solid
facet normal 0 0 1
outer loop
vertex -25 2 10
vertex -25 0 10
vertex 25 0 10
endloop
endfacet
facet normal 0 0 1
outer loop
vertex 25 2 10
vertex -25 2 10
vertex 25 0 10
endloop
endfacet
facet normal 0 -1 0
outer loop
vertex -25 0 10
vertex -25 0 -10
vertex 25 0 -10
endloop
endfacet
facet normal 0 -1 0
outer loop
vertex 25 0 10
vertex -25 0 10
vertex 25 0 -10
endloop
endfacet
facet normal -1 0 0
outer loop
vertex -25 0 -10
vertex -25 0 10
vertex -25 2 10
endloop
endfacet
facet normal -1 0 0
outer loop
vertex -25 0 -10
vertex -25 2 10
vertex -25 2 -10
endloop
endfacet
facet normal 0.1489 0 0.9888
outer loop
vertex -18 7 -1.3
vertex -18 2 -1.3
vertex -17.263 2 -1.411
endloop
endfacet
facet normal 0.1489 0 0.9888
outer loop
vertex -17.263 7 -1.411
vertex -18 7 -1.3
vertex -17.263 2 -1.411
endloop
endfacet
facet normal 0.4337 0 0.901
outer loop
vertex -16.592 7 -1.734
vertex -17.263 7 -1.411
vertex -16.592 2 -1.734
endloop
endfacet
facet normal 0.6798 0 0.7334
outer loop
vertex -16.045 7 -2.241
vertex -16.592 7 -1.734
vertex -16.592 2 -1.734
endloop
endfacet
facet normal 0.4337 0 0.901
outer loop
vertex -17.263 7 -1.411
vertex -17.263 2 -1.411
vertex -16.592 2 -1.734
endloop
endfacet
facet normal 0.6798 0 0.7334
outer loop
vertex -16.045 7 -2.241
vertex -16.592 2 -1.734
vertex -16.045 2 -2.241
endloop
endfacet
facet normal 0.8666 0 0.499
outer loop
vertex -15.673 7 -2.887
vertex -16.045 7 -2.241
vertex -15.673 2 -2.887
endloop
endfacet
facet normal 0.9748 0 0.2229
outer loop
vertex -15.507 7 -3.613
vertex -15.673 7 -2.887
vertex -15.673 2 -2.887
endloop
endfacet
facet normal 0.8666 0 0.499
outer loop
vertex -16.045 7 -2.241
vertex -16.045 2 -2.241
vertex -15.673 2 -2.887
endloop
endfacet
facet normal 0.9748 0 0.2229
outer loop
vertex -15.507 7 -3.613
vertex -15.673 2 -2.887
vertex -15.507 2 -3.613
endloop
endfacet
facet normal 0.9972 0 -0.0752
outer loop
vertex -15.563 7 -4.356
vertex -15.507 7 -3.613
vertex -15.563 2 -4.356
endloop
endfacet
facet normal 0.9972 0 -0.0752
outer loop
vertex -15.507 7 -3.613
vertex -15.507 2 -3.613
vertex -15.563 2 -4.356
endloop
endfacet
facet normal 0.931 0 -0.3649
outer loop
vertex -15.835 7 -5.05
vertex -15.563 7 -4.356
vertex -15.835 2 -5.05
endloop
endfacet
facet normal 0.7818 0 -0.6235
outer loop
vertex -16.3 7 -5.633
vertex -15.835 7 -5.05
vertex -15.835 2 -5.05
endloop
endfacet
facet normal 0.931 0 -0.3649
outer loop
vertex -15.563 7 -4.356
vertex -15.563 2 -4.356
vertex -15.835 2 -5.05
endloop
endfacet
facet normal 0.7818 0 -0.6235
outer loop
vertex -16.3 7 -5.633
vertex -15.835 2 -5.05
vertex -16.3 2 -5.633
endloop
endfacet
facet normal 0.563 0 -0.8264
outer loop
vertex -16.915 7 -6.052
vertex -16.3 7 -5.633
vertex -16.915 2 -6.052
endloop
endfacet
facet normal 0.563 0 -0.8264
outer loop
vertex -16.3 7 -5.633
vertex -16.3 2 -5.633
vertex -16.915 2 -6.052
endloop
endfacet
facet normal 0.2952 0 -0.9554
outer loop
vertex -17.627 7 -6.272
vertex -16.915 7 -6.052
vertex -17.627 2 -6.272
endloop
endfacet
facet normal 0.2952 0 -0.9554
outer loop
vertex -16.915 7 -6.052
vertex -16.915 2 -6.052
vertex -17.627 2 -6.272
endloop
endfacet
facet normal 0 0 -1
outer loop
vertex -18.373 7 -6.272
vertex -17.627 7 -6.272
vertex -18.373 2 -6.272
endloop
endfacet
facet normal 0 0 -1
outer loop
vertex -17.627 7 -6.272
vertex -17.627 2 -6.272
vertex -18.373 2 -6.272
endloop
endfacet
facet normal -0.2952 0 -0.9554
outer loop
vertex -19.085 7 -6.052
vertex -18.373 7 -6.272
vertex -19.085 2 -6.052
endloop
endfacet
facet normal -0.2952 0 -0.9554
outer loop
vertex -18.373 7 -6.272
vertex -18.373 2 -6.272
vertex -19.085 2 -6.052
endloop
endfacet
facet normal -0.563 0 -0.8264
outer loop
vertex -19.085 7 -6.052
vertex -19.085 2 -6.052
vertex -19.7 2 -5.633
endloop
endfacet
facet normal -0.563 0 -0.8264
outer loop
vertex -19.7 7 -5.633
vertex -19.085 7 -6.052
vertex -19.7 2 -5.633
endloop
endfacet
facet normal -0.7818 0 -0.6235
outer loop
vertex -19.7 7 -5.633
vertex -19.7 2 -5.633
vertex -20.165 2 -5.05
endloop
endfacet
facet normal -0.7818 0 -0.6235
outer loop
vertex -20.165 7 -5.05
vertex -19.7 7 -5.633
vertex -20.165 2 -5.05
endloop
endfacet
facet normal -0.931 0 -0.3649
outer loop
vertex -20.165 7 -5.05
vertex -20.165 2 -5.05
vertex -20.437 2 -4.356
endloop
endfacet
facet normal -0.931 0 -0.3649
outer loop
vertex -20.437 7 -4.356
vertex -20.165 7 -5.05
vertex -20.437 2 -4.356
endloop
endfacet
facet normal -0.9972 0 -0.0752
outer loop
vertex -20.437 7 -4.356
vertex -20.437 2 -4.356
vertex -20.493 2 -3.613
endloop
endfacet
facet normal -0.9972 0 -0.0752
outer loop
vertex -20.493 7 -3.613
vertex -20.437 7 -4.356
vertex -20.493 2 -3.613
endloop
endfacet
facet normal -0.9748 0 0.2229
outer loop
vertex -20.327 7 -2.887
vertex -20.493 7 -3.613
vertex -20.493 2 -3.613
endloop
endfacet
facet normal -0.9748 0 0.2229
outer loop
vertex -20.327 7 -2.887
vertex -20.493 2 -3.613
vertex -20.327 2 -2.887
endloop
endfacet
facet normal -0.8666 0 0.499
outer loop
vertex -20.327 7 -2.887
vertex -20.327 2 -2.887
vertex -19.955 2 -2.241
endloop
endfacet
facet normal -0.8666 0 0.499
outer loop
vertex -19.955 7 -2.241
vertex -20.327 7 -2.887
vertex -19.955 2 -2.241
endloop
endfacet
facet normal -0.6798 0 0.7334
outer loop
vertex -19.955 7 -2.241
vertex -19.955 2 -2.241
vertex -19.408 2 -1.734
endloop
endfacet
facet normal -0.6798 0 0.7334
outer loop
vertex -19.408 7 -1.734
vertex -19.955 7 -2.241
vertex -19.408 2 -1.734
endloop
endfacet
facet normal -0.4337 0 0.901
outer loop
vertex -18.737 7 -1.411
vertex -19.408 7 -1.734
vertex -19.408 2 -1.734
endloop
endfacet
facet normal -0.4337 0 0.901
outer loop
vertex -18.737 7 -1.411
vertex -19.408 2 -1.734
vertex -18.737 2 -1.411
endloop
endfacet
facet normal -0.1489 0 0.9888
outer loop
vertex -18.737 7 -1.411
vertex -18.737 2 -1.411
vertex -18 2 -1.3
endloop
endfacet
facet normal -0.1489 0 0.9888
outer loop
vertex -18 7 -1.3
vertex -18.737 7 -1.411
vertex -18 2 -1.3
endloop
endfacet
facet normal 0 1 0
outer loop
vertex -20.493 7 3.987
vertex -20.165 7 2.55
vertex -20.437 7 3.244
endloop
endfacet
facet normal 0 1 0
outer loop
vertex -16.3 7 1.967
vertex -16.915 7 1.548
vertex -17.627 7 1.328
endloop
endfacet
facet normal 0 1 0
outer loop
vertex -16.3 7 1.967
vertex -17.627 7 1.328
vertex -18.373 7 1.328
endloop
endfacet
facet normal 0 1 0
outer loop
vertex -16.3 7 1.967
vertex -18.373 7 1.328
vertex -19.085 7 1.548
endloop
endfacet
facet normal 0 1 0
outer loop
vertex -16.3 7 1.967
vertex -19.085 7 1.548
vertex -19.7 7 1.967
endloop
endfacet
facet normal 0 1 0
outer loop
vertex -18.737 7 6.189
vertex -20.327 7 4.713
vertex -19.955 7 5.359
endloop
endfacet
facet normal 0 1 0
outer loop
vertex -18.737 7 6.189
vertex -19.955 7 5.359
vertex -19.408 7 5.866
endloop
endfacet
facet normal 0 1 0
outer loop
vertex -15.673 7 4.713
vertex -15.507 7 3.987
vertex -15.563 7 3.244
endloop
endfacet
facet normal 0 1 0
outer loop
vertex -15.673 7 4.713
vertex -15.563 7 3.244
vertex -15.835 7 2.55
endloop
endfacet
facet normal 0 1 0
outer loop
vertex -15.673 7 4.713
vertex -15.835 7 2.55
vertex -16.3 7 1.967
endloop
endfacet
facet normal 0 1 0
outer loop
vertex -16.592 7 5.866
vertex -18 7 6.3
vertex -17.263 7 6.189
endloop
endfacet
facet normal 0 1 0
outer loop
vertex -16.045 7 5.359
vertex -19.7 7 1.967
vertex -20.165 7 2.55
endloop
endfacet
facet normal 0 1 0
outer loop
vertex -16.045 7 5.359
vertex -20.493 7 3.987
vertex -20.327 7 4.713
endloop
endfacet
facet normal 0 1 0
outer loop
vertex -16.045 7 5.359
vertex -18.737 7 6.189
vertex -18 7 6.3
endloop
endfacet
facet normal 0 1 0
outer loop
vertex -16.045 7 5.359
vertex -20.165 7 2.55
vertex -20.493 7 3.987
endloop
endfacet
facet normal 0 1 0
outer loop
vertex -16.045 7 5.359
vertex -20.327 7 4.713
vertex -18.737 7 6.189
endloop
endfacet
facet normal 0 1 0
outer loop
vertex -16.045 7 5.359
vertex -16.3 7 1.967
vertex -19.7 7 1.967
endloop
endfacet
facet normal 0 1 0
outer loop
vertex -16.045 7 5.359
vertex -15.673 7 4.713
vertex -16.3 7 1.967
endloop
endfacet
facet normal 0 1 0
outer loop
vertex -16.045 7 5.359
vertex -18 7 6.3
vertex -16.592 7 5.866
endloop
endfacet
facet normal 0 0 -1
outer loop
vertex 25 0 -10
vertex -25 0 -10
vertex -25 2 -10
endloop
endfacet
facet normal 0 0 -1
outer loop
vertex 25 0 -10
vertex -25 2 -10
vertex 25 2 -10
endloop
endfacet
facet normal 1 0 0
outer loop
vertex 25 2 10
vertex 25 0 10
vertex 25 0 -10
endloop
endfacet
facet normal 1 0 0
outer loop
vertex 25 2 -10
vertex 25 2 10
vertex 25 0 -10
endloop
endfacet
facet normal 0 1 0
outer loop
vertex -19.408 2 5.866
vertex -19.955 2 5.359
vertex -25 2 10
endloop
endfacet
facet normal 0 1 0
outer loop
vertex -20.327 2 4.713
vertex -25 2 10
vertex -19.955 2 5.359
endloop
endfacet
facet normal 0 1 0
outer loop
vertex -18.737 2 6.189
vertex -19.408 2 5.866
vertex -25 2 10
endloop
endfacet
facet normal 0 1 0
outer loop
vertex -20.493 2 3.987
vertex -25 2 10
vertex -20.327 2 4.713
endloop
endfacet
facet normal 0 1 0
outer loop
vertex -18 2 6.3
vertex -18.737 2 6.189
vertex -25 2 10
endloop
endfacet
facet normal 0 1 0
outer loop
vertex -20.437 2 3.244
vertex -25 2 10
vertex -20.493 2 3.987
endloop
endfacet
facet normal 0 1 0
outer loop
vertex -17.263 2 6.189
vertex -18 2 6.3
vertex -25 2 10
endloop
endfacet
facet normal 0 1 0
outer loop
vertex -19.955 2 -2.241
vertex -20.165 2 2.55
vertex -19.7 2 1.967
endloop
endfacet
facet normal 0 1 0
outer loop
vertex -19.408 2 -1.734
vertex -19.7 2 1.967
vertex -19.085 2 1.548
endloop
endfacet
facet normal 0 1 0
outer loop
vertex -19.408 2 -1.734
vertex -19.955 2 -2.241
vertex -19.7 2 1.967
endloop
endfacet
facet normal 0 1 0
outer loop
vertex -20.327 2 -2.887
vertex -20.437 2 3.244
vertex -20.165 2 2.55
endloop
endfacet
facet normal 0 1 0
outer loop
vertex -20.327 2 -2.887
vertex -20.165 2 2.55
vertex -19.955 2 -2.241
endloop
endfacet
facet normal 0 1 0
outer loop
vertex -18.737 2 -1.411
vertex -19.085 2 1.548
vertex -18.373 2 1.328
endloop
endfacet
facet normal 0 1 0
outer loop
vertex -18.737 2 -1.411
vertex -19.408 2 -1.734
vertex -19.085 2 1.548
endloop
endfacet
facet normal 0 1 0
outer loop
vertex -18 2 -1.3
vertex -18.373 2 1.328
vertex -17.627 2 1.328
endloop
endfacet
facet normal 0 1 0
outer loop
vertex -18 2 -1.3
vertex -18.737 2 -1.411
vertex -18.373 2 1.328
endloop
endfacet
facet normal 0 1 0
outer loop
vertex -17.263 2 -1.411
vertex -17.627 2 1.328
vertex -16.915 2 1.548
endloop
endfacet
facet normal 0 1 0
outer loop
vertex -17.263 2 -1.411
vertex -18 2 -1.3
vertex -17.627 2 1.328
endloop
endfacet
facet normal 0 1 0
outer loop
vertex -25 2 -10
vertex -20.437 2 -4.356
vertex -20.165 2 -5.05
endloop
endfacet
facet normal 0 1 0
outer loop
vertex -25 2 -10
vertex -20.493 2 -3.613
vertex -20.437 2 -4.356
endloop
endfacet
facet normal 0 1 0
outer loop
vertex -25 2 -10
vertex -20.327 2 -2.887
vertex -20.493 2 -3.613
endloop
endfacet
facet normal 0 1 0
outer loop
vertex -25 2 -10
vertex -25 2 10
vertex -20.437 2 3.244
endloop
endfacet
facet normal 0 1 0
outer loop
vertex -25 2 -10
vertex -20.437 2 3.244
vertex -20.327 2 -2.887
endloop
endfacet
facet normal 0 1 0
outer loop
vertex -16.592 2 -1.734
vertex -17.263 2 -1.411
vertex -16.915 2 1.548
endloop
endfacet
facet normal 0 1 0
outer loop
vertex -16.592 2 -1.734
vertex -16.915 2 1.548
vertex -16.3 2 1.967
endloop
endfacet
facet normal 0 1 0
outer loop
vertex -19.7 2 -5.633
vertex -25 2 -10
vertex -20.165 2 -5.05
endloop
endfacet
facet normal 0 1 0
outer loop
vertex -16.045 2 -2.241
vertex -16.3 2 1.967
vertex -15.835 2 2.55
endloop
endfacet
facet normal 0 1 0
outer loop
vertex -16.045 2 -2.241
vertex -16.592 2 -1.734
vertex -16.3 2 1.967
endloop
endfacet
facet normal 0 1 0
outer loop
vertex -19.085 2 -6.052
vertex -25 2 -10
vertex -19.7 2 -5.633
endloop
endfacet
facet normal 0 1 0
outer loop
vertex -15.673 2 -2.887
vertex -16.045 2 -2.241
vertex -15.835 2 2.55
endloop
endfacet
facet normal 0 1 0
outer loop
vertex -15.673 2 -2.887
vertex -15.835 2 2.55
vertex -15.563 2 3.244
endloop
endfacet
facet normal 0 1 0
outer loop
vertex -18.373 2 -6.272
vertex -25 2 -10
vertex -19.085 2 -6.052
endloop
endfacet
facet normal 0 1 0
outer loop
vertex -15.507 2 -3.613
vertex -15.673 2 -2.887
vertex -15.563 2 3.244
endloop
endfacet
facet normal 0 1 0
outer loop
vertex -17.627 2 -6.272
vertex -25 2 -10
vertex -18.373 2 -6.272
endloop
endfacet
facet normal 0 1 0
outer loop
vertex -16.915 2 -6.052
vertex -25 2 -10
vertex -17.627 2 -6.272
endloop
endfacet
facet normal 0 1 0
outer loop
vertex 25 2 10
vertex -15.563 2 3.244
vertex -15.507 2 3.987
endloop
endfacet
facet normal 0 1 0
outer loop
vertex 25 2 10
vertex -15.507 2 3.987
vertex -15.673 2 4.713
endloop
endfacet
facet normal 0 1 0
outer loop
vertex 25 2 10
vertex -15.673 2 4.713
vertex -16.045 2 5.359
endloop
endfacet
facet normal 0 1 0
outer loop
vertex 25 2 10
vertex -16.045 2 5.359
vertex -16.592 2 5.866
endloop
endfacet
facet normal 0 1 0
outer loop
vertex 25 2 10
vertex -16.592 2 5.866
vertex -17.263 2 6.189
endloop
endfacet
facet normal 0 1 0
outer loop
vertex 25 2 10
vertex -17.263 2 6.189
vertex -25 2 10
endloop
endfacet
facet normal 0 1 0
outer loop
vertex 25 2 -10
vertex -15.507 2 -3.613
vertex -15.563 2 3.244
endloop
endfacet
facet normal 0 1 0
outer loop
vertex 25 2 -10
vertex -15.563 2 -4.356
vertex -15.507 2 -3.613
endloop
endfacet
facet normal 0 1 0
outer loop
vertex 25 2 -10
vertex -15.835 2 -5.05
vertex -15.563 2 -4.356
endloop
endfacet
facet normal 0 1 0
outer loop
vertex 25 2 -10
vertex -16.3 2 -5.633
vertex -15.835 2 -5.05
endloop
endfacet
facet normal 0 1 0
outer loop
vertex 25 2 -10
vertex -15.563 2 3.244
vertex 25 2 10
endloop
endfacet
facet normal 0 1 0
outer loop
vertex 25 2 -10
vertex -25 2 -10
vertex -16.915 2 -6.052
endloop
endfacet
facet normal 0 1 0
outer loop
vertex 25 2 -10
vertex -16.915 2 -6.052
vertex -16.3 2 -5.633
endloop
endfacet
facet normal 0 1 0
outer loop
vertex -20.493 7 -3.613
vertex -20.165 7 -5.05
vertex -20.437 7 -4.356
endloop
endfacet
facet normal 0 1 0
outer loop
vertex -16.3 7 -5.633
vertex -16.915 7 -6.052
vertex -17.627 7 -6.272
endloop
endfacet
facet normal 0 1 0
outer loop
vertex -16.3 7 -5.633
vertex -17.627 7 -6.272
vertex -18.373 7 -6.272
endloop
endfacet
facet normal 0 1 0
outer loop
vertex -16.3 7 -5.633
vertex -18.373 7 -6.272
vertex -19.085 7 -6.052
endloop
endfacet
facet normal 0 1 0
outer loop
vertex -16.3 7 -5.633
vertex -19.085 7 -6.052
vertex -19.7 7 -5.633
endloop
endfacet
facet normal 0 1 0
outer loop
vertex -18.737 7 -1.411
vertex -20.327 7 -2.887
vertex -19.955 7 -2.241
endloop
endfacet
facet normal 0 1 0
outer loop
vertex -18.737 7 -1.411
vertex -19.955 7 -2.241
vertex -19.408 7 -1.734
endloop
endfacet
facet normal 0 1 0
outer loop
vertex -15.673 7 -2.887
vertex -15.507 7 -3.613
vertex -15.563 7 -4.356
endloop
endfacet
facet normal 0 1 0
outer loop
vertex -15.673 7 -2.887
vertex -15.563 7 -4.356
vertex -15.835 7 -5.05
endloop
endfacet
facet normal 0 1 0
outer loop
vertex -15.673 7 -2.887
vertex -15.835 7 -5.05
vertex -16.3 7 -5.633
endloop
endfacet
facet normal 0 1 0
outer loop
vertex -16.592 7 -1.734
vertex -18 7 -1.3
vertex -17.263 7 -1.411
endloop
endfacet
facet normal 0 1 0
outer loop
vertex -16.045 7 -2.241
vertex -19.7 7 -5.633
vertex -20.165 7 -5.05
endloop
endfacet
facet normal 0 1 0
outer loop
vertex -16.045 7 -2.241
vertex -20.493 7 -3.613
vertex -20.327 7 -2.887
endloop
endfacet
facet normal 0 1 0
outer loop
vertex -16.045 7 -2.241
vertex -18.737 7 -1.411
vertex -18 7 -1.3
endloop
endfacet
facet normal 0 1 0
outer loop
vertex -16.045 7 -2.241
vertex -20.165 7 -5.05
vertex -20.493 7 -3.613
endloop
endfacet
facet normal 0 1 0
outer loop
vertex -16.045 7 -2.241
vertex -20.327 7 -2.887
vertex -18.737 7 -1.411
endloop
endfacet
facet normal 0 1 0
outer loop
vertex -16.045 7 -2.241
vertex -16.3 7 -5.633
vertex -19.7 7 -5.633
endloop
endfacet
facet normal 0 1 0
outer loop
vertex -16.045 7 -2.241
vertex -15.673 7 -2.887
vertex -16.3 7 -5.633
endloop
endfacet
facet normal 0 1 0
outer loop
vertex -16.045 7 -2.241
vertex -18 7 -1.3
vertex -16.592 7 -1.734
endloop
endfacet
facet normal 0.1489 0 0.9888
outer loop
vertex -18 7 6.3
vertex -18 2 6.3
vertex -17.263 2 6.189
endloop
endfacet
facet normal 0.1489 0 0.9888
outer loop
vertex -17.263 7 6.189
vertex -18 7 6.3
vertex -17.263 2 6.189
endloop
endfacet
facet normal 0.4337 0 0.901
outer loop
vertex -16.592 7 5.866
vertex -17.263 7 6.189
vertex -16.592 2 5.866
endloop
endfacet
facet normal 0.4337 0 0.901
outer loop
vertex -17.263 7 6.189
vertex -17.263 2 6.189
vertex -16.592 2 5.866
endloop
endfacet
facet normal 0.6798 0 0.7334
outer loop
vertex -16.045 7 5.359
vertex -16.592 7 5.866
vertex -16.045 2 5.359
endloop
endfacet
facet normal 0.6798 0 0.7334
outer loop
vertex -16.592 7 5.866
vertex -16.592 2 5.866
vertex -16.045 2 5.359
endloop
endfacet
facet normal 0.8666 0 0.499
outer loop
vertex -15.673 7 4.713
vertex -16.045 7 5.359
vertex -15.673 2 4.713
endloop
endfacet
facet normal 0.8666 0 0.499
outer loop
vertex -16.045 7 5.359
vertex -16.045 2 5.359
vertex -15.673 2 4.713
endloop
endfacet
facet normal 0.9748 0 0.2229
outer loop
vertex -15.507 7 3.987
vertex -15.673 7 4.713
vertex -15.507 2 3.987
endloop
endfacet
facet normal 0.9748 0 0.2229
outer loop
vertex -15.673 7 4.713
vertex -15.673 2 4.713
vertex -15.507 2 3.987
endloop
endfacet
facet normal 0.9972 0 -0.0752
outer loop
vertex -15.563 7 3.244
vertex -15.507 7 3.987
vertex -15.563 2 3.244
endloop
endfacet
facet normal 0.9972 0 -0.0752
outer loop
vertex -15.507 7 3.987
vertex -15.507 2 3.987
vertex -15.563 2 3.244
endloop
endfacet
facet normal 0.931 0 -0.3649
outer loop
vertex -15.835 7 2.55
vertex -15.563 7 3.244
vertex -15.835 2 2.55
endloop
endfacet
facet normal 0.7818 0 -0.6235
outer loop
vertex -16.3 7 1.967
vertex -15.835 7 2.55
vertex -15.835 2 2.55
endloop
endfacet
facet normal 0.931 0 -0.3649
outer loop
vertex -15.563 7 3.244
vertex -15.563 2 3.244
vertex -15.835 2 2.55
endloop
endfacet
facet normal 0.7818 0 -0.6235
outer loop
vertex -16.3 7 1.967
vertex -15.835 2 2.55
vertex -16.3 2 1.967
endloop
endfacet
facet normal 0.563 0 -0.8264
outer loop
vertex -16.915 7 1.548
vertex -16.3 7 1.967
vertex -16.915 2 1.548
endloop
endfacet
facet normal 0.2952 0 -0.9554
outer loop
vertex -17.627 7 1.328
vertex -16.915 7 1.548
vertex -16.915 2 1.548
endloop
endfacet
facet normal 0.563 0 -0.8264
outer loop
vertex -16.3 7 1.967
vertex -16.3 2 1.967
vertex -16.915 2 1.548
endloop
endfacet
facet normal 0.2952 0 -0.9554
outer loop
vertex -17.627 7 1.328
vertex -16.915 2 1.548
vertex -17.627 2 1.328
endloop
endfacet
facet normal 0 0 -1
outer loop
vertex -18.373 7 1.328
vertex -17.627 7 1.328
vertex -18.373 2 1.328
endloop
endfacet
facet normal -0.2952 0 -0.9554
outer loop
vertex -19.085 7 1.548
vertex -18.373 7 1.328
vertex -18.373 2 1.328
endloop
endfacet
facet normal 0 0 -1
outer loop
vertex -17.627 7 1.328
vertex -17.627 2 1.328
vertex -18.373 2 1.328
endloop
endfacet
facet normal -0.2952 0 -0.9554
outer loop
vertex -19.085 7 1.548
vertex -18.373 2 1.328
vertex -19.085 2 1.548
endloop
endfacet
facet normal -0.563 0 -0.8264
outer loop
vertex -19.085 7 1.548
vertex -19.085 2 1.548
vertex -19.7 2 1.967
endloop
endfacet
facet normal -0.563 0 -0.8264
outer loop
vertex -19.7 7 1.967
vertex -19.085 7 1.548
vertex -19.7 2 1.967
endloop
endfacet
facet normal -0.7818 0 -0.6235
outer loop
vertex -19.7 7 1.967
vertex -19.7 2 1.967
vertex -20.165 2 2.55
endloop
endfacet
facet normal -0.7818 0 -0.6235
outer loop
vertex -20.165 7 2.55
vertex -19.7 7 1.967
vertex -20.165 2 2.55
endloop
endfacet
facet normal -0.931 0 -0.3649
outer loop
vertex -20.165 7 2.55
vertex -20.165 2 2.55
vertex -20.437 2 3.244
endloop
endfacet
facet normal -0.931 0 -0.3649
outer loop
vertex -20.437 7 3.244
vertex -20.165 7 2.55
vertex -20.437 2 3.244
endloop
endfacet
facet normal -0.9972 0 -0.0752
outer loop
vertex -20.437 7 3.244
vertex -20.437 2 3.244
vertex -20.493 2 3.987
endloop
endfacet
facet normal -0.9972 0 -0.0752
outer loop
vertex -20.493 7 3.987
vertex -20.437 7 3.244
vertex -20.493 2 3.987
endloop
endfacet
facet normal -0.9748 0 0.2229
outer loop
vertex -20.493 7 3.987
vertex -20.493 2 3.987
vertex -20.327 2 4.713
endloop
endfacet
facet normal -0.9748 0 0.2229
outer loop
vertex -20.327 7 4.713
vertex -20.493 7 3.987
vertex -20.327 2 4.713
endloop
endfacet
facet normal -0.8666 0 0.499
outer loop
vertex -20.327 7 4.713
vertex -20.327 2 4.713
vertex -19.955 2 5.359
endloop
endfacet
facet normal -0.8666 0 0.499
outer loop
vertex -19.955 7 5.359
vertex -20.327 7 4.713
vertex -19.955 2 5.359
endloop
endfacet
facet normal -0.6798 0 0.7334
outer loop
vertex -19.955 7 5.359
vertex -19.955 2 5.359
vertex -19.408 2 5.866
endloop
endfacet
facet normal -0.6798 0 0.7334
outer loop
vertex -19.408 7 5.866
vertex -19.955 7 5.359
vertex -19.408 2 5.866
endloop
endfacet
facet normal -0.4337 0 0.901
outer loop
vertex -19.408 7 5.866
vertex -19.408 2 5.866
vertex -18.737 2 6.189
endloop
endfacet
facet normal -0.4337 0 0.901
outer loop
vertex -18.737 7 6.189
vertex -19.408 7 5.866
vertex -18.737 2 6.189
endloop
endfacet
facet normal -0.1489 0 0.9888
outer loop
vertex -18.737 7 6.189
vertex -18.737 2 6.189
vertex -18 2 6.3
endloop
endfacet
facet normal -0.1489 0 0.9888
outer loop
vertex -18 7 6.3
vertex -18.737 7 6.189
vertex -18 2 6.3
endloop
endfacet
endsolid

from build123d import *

# Parameters (mm, degrees)
SKETCH_1_W      = 50
SKETCH_1_H      = 20
SKETCH_1_R      = 2.5
EXTRUDE_1_DEPTH = 2
SKETCH_1_3_R    = 2.5
EXTRUDE_2_DEPTH = 7


with BuildPart() as part:
    # 草图1 → 凸台-拉伸1 (new body)
    with BuildSketch(Plane(origin=(0, 0, 0), x_dir=(1, 0, 0), z_dir=(0, 1, 0))):
        Rectangle(SKETCH_1_W, SKETCH_1_H)
        with Locations((-18, 3.8)):
            Circle(SKETCH_1_R, mode=Mode.SUBTRACT)
        with Locations((-18, -3.8)):
            Circle(SKETCH_1_R, mode=Mode.SUBTRACT)
    extrude(amount=EXTRUDE_1_DEPTH)

    # 草图1<3> → 凸台-拉伸2 (add)
    with BuildSketch(Plane(origin=(0, 0, 0), x_dir=(1, 0, 0), z_dir=(0, 1, 0))):
        with Locations((-18, 3.8)):
            Circle(SKETCH_1_3_R)
        with Locations((-18, -3.8)):
            Circle(SKETCH_1_3_R)
    extrude(amount=EXTRUDE_2_DEPTH)


solid = part.part
